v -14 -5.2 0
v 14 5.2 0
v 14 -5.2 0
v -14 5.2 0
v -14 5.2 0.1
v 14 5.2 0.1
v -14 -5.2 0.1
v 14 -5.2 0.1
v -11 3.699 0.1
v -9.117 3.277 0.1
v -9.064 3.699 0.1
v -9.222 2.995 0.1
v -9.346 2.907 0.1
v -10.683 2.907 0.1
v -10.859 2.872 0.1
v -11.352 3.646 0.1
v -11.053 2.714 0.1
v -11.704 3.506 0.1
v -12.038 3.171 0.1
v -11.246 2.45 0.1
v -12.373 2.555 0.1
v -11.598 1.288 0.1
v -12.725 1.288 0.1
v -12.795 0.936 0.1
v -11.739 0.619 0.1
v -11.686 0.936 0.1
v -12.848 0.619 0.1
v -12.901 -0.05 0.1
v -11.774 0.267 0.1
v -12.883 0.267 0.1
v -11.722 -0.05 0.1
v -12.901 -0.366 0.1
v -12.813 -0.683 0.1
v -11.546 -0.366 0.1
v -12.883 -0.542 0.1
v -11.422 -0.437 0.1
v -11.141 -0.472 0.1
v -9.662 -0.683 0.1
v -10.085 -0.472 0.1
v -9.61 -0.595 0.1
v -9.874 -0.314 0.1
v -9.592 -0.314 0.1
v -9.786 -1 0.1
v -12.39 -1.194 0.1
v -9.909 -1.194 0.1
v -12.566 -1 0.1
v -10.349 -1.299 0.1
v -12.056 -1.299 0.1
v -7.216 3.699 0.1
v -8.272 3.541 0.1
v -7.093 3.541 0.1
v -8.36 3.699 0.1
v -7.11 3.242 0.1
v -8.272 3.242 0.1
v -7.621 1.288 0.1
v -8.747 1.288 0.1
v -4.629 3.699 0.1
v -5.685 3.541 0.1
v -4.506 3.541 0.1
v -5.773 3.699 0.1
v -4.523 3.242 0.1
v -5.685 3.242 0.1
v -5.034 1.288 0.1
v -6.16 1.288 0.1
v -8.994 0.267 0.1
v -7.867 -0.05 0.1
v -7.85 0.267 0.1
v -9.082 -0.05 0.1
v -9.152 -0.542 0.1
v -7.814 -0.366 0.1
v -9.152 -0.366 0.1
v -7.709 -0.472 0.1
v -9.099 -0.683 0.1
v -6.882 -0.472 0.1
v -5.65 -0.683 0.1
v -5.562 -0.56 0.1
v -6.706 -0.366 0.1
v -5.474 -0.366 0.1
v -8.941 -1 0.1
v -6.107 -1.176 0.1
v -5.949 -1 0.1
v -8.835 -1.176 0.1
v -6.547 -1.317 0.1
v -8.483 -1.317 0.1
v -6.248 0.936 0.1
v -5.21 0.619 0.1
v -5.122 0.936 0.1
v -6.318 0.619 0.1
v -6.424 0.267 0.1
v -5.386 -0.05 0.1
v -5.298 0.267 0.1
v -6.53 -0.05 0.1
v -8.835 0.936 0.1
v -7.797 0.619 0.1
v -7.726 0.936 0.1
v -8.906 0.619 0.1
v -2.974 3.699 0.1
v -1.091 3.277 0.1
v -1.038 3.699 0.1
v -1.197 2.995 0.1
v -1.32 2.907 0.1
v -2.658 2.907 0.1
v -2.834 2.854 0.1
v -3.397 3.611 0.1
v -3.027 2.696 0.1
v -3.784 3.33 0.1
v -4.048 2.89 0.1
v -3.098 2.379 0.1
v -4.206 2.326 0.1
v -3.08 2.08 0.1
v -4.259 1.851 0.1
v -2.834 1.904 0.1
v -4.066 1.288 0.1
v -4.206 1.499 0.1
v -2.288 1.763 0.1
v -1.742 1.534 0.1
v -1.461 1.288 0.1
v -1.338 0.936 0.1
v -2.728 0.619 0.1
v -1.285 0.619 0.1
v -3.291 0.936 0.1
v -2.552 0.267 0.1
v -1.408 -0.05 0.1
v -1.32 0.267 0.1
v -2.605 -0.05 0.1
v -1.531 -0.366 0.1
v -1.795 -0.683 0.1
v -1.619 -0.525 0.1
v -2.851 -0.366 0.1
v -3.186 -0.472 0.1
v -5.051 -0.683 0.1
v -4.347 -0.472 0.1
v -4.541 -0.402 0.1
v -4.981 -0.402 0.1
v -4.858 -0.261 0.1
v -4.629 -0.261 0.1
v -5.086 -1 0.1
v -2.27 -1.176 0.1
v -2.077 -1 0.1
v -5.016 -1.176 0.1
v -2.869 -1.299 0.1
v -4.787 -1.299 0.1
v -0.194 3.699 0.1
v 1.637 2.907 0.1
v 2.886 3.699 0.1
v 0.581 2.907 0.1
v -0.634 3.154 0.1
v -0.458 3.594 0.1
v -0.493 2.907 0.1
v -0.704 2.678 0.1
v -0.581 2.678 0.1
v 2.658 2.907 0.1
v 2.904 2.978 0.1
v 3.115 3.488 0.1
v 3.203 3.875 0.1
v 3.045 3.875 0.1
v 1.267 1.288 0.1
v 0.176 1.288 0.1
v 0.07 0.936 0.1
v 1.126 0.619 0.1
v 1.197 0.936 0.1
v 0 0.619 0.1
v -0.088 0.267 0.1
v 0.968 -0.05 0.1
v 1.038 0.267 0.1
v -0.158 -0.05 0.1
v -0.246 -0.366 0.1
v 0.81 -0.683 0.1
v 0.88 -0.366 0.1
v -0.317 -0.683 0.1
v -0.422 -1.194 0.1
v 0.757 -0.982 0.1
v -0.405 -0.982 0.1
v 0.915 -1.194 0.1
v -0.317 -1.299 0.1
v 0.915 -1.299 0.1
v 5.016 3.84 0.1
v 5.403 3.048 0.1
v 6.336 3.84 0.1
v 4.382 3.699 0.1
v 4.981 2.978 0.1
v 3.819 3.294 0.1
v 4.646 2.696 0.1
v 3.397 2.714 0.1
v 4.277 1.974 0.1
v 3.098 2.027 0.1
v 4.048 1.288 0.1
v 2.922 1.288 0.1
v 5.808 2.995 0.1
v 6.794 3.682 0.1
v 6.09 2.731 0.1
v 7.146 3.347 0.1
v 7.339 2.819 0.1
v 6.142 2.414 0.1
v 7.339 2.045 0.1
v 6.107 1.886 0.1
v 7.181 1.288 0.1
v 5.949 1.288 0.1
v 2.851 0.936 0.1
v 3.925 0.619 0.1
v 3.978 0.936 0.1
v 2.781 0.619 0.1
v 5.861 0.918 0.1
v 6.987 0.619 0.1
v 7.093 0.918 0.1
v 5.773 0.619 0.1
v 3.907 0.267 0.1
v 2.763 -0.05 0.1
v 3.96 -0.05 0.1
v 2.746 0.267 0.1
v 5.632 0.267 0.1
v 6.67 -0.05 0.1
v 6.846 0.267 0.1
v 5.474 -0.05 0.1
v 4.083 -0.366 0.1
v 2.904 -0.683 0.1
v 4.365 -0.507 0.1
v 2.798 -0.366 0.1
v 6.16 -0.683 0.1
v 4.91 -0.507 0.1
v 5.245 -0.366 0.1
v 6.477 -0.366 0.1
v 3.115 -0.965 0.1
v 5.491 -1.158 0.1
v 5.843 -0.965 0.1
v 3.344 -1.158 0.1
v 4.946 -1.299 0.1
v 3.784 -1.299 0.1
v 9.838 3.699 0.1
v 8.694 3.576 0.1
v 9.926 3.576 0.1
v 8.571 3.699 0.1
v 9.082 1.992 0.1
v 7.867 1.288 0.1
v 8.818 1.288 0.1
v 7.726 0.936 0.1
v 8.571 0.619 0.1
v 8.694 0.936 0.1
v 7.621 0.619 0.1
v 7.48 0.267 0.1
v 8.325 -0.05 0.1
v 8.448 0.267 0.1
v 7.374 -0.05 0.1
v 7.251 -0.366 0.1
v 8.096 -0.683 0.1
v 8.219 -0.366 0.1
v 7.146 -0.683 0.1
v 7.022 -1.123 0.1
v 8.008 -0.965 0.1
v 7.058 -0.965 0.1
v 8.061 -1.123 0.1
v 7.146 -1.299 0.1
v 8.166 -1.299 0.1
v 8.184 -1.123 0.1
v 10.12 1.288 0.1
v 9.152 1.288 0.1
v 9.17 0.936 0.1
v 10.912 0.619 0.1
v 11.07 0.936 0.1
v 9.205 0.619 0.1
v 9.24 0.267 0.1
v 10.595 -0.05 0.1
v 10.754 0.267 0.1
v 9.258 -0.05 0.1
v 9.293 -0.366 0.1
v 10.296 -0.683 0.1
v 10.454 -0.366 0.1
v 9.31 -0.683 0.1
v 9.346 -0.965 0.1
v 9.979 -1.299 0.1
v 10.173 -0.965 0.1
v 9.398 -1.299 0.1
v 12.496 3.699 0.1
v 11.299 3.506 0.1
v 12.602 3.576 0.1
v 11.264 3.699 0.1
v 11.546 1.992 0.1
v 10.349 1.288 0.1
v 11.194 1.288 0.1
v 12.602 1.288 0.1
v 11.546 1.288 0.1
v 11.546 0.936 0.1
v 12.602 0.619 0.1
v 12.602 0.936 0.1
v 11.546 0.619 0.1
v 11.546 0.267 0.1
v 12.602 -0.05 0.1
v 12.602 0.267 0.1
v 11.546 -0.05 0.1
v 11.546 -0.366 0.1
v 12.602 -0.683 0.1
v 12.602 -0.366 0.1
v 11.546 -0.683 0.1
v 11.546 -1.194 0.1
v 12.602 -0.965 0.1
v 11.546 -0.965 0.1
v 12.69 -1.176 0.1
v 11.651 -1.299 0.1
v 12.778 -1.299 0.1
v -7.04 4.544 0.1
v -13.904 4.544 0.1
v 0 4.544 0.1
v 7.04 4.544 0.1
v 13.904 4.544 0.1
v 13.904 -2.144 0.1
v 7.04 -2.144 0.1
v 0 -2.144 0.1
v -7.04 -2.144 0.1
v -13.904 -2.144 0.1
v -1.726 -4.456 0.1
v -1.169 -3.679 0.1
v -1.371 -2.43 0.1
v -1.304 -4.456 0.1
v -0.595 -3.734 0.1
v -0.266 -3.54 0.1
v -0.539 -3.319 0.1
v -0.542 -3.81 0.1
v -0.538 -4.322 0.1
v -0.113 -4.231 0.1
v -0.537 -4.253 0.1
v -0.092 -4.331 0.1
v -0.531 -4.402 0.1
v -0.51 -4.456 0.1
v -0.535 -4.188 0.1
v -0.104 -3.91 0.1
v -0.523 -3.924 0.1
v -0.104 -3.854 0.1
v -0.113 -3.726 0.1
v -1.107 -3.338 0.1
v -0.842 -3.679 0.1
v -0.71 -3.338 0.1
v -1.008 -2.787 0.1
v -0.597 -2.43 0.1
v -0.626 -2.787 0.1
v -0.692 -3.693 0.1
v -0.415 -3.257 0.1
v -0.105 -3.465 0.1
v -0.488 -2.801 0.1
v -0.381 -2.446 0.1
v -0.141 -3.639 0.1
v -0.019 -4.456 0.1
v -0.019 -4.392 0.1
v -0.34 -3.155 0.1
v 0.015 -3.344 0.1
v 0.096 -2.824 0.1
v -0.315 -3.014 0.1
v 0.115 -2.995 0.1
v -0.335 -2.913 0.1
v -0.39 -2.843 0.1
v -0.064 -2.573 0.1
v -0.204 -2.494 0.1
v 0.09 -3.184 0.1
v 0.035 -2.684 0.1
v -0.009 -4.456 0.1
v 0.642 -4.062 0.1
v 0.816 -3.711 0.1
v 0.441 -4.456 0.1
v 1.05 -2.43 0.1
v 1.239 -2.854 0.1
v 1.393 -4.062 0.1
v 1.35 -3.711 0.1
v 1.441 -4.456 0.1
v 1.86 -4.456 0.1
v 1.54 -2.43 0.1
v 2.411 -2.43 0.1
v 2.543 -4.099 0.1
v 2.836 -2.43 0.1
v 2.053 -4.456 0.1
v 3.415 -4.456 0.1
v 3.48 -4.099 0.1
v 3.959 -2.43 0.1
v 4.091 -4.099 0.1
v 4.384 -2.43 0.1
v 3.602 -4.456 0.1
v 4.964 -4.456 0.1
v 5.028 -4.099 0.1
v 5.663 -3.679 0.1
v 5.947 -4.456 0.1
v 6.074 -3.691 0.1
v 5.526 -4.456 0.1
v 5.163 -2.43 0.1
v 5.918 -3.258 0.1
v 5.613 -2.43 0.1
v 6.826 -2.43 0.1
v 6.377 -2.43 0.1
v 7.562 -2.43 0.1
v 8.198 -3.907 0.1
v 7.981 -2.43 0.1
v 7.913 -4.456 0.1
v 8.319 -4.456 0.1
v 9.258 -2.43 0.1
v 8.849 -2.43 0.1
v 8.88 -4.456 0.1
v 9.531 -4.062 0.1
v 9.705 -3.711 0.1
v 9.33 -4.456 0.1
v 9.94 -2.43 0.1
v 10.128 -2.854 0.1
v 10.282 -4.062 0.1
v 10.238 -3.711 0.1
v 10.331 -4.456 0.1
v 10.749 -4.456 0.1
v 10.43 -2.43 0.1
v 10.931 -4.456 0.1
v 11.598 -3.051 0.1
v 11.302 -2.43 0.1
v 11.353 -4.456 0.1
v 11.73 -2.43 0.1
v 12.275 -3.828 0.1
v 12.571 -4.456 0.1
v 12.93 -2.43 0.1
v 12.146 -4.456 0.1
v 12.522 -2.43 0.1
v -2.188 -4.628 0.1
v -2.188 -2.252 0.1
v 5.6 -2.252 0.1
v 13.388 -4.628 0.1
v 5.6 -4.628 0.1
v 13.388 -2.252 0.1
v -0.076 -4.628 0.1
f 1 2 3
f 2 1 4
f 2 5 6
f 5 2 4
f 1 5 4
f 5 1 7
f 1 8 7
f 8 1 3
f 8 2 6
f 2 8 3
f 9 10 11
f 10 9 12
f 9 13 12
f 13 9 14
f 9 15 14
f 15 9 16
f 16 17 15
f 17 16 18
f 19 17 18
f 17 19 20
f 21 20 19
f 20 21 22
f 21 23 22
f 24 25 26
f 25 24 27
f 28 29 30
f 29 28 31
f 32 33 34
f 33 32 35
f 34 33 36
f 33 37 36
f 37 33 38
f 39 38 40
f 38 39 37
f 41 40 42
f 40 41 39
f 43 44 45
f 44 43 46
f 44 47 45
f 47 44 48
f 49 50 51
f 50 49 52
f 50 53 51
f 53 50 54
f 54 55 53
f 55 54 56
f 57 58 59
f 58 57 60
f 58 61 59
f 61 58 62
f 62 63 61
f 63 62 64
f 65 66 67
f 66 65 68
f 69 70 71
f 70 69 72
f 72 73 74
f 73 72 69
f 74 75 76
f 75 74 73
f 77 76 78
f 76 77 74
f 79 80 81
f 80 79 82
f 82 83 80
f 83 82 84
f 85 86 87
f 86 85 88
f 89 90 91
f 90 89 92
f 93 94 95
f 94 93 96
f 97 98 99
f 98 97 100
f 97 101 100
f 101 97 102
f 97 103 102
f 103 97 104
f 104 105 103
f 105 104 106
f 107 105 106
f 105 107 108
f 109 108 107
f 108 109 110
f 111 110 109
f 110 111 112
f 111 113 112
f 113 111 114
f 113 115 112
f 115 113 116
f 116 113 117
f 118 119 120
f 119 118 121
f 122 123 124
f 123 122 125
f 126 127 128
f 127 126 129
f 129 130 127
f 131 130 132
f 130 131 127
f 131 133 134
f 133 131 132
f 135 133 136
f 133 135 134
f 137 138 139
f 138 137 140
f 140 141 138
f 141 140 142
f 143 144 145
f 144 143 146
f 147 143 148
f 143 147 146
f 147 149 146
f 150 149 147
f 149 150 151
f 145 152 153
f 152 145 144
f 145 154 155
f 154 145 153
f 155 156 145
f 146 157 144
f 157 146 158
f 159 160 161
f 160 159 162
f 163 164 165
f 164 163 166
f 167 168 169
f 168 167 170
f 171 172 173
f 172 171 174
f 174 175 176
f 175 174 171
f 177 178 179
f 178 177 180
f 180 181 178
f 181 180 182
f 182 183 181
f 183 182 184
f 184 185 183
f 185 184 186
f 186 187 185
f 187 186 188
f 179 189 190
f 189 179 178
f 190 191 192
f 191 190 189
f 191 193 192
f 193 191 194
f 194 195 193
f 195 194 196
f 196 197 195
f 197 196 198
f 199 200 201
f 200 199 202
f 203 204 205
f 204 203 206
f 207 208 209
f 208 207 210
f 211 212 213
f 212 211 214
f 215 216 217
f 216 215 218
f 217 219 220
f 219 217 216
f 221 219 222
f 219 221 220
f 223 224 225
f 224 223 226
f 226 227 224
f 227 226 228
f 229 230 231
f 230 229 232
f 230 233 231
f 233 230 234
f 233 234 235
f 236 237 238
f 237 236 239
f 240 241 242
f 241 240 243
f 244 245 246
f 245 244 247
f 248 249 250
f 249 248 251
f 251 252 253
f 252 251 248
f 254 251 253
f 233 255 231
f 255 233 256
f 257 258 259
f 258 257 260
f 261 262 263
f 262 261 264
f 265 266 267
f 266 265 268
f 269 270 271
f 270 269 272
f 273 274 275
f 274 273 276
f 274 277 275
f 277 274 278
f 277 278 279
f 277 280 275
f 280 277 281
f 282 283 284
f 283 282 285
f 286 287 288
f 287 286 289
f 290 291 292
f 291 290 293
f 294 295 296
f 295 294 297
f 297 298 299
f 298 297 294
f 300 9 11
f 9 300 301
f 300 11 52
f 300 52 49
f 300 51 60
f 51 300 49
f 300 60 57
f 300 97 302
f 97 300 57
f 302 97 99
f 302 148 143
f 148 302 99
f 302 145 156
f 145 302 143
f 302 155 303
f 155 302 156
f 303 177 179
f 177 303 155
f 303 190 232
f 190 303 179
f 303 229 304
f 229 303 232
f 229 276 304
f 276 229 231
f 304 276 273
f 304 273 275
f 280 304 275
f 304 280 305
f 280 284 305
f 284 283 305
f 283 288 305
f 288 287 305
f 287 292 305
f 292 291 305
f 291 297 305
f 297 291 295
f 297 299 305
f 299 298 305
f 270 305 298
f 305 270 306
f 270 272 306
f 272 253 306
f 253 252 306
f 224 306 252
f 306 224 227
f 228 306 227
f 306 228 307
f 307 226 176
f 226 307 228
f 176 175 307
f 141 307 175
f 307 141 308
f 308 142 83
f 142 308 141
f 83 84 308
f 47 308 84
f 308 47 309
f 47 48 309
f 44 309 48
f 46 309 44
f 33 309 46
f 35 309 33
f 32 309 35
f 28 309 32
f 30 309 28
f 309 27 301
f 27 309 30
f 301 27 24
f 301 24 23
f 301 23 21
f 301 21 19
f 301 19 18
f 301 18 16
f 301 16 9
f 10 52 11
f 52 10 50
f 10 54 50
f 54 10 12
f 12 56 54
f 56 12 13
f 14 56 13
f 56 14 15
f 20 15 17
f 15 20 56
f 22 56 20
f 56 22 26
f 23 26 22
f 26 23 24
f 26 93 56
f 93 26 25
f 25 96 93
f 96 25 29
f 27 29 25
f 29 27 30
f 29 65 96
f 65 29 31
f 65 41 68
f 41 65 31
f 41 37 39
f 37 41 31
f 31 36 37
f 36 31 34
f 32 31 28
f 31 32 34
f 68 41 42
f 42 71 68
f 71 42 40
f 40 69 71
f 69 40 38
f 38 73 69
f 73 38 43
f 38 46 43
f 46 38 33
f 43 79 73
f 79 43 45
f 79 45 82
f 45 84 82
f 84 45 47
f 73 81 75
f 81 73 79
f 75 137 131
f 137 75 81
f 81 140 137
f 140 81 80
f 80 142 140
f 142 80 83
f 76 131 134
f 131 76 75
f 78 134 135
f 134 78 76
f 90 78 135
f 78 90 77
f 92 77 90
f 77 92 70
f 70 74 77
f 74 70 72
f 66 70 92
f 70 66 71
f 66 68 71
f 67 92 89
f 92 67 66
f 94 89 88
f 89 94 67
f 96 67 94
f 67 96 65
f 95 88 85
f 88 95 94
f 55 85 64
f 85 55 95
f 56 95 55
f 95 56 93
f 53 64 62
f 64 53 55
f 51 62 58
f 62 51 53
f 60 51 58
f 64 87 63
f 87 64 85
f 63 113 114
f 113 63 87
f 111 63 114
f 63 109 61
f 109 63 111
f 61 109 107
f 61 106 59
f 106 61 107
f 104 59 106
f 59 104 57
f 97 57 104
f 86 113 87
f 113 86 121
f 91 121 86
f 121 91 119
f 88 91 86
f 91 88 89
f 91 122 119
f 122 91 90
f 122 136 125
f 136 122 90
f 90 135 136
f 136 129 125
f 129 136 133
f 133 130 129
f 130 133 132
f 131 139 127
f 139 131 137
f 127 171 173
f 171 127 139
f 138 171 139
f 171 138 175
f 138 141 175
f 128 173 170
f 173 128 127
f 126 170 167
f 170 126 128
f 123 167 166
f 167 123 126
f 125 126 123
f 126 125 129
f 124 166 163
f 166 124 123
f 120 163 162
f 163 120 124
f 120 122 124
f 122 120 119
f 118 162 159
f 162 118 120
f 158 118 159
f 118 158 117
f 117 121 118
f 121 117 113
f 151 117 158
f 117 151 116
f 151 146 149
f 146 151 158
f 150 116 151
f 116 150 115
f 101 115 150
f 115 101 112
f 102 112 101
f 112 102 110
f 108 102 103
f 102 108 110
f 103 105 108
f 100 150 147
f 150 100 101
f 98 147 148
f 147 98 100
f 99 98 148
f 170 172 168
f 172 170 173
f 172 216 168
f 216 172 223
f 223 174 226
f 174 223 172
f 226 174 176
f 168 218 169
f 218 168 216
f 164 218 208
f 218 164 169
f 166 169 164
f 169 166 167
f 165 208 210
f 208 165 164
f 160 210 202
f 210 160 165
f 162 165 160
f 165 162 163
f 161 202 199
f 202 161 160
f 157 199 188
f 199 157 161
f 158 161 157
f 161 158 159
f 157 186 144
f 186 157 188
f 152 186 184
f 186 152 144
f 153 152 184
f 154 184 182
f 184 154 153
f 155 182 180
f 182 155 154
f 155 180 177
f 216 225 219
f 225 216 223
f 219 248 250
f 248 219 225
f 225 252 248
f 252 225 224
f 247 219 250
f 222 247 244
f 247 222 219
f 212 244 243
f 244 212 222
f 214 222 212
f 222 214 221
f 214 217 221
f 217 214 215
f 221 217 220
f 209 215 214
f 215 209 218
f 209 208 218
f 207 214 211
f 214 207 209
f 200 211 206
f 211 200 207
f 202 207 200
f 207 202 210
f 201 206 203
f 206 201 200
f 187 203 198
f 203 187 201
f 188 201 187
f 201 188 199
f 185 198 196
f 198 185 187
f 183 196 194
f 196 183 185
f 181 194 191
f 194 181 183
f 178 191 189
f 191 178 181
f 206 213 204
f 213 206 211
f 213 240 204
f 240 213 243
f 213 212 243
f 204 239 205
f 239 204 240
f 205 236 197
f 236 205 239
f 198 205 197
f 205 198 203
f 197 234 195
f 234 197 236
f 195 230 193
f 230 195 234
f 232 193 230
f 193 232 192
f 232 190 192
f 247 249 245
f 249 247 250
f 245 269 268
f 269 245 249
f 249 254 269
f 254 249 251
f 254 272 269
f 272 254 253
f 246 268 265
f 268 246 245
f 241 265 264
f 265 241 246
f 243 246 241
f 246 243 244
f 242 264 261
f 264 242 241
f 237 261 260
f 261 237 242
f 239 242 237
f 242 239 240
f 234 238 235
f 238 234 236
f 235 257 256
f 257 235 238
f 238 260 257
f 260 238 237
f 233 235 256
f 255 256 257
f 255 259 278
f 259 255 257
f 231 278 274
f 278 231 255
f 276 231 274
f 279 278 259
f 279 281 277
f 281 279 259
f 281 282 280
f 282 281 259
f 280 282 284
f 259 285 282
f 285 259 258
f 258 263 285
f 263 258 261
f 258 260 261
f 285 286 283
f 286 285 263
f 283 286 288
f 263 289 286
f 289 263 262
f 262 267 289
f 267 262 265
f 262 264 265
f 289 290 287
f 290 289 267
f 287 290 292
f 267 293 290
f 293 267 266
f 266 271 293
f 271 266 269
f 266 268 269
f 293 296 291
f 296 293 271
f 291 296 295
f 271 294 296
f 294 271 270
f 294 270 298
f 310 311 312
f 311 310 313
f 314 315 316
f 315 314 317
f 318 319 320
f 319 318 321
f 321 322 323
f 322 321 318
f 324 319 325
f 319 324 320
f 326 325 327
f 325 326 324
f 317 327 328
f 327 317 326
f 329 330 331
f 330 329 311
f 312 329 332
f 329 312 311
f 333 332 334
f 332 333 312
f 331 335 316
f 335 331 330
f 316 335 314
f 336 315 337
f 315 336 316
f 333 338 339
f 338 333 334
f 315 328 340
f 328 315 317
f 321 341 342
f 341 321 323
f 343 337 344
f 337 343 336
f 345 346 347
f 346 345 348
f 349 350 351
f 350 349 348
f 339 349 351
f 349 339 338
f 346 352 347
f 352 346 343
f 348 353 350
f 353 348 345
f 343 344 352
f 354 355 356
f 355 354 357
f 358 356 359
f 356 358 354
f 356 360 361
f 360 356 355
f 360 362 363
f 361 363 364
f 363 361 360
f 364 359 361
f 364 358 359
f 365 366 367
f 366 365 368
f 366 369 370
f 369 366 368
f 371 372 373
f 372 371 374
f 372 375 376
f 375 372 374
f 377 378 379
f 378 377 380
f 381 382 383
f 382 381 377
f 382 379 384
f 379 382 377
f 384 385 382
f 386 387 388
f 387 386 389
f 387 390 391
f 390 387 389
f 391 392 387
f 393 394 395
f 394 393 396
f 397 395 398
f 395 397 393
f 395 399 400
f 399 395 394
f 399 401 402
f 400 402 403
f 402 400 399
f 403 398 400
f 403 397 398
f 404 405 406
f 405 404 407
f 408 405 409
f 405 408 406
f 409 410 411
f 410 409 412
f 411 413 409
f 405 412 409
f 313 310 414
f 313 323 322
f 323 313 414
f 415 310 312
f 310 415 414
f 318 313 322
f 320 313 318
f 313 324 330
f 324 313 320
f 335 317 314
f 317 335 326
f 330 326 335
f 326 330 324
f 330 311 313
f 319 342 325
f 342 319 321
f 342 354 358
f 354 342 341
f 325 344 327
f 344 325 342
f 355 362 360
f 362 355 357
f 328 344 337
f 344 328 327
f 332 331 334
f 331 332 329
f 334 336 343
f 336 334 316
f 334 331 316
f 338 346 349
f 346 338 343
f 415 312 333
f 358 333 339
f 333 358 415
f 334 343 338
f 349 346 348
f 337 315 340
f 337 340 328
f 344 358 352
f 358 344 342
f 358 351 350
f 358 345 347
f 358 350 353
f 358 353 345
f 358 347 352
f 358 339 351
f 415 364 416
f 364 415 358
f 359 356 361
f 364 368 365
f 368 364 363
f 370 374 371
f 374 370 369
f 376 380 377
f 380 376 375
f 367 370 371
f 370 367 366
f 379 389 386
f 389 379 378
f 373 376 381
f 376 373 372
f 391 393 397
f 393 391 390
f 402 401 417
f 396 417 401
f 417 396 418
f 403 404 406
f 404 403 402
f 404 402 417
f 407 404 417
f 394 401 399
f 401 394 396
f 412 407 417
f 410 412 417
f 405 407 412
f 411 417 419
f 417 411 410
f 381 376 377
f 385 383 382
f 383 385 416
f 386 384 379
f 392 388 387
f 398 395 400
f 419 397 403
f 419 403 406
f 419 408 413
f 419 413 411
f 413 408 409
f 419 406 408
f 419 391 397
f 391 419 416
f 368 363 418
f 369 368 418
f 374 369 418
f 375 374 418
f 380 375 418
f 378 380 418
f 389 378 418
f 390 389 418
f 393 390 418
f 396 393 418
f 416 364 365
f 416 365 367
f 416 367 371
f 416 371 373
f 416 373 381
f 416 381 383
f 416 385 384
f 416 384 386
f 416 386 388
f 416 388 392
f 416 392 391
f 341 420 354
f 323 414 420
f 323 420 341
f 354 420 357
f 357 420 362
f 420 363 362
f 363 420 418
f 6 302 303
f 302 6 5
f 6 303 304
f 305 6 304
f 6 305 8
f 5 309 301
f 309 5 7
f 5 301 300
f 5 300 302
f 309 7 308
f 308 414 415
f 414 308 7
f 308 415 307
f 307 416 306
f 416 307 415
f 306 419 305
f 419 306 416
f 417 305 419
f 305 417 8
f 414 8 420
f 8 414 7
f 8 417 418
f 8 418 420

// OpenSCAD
use <../lib.scad>
use <../p/box5-12.scad>
use <s/162275as01.scad>
use <s/162275bs01.scad>
use <s/162275bs02.scad>
function ldraw_lib__162275d() = [
// 0 Sticker  1.3 x  3.5 with Black "CUSTOM RALLY VAN" on Transparent Background
// 0 Name: 162275d.dat
// 0 Author: Takeshi Takahashi [RainbowDolphin]
// 0 !LDRAW_ORG Part UPDATE 2024-03
// 0 !LICENSE Licensed under CC BY 4.0 : see CAreadme.txt
// 
// 0 BFC CERTIFY CCW
  [0,"BFC","CERTIFY"],
  [0,"BFC","CCW"],
// 
// 0 !KEYWORDS Bricklink 5550stk01, Brickowl 321461, Custom Rally Van, Model Team
// 0 !KEYWORDS Rebrickable 162275, Set 5550, truck
// 
// 0 !HISTORY 2024-04-28 [OrionP] Official Update 2024-03
// 
// 1 16 0 -0.25 0 35 0 0 0 0.25 0 0 0 13 box5-12.dat
  [1,16,0,-0.25,0,35,0,0,0,0.25,0,0,0,13, ldraw_lib__box5_12()],
// 1 16 0 -0.25 3 0.44 0 0 0 1 0 0 0 0.44 s\162275as01.dat
  [1,16,0,-0.25,3,0.44,0,0,0,1,0,0,0,0.44, ldraw_lib__s__162275as01()],
// 0 BFC NOCLIP
  [0,"BFC","NOCLIP"],
// 1 0 14 -.25 -8.6 .33 0 0 0 1 0 0 0 .33 s\162275bs01.dat
  [1,0,14,-.25,-8.6,.33,0,0,0,1,0,0,0,.33, ldraw_lib__s__162275bs01()],
// 0 BFC CLIP
  [0,"BFC","CLIP"],
// 1 16 14 -.25 -8.6 .33 0 0 0 1 0 0 0 .33 s\162275bs02.dat
  [1,16,14,-.25,-8.6,.33,0,0,0,1,0,0,0,.33, ldraw_lib__s__162275bs02()],
// 4 16 35 -0.25 13 -35 -0.25 13 0 -0.25 11.36 17.6 -0.25 11.36
  [4,16,35,-0.25,13,-35,-0.25,13,0,-0.25,11.36,17.6,-0.25,11.36],
// 3 16 35 -0.25 13 17.6 -0.25 11.36 34.76 -0.25 11.36
  [3,16,35,-0.25,13,17.6,-0.25,11.36,34.76,-0.25,11.36],
// 4 16 35 -0.25 13 34.76 -0.25 11.36 34.76 -0.25 -5.36 35 -0.25 -13
  [4,16,35,-0.25,13,34.76,-0.25,11.36,34.76,-0.25,-5.36,35,-0.25,-13],
// 4 16 -35 -0.25 13 -35 -0.25 -13 -34.76 -0.25 -5.36 -34.76 -0.25 11.36
  [4,16,-35,-0.25,13,-35,-0.25,-13,-34.76,-0.25,-5.36,-34.76,-0.25,11.36],
// 3 16 -35 -0.25 13 -34.76 -0.25 11.36 -17.6 -0.25 11.36
  [3,16,-35,-0.25,13,-34.76,-0.25,11.36,-17.6,-0.25,11.36],
// 3 16 -35 -0.25 13 -17.6 -0.25 11.36 0 -0.25 11.36
  [3,16,-35,-0.25,13,-17.6,-0.25,11.36,0,-0.25,11.36],
// 3 16 -34.76 -.25 -5.36 -35 -.25 -13 -17.6 -.25 -5.36
  [3,16,-34.76,-.25,-5.36,-35,-.25,-13,-17.6,-.25,-5.36],
// 4 16 -5.47 -.25 -5.63 -17.6 -.25 -5.36 -35 -.25 -13 -5.47 -.25 -11.57
  [4,16,-5.47,-.25,-5.63,-17.6,-.25,-5.36,-35,-.25,-13,-5.47,-.25,-11.57],
// 3 16 -17.6 -.25 -5.36 -5.47 -.25 -5.63 0 -.25 -5.36
  [3,16,-17.6,-.25,-5.36,-5.47,-.25,-5.63,0,-.25,-5.36],
// 4 16 17.6 -.25 -5.36 0 -.25 -5.36 -5.47 -.25 -5.63 14 -.25 -5.63
  [4,16,17.6,-.25,-5.36,0,-.25,-5.36,-5.47,-.25,-5.63,14,-.25,-5.63],
// 4 16 34.76 -.25 -5.36 17.6 -.25 -5.36 14 -.25 -5.63 33.47 -.25 -5.63
  [4,16,34.76,-.25,-5.36,17.6,-.25,-5.36,14,-.25,-5.63,33.47,-.25,-5.63],
// 4 16 35 -.25 -13 34.76 -.25 -5.36 33.47 -.25 -5.63 33.47 -.25 -11.57
  [4,16,35,-.25,-13,34.76,-.25,-5.36,33.47,-.25,-5.63,33.47,-.25,-11.57],
// 4 16 -.19 -.25 -11.57 -5.47 -.25 -11.57 -35 -.25 -13 35 -.25 -13
  [4,16,-.19,-.25,-11.57,-5.47,-.25,-11.57,-35,-.25,-13,35,-.25,-13],
// 3 16 35 -.25 -13 33.47 -.25 -11.57 14 -.25 -11.57
  [3,16,35,-.25,-13,33.47,-.25,-11.57,14,-.25,-11.57],
// 3 16 35 -.25 -13 14 -.25 -11.57 -.19 -.25 -11.57
  [3,16,35,-.25,-13,14,-.25,-11.57,-.19,-.25,-11.57],
];
module ldraw_lib__162275d(step=0, col=false, unit=2/5, alt=false, line=0.2, solid=!$preview)
    makepoly(ldraw_lib__162275d(), step=step, col=col, unit=unit, alt=alt, line=line, solid=solid);
ldraw_lib__162275d(line=0.2);
